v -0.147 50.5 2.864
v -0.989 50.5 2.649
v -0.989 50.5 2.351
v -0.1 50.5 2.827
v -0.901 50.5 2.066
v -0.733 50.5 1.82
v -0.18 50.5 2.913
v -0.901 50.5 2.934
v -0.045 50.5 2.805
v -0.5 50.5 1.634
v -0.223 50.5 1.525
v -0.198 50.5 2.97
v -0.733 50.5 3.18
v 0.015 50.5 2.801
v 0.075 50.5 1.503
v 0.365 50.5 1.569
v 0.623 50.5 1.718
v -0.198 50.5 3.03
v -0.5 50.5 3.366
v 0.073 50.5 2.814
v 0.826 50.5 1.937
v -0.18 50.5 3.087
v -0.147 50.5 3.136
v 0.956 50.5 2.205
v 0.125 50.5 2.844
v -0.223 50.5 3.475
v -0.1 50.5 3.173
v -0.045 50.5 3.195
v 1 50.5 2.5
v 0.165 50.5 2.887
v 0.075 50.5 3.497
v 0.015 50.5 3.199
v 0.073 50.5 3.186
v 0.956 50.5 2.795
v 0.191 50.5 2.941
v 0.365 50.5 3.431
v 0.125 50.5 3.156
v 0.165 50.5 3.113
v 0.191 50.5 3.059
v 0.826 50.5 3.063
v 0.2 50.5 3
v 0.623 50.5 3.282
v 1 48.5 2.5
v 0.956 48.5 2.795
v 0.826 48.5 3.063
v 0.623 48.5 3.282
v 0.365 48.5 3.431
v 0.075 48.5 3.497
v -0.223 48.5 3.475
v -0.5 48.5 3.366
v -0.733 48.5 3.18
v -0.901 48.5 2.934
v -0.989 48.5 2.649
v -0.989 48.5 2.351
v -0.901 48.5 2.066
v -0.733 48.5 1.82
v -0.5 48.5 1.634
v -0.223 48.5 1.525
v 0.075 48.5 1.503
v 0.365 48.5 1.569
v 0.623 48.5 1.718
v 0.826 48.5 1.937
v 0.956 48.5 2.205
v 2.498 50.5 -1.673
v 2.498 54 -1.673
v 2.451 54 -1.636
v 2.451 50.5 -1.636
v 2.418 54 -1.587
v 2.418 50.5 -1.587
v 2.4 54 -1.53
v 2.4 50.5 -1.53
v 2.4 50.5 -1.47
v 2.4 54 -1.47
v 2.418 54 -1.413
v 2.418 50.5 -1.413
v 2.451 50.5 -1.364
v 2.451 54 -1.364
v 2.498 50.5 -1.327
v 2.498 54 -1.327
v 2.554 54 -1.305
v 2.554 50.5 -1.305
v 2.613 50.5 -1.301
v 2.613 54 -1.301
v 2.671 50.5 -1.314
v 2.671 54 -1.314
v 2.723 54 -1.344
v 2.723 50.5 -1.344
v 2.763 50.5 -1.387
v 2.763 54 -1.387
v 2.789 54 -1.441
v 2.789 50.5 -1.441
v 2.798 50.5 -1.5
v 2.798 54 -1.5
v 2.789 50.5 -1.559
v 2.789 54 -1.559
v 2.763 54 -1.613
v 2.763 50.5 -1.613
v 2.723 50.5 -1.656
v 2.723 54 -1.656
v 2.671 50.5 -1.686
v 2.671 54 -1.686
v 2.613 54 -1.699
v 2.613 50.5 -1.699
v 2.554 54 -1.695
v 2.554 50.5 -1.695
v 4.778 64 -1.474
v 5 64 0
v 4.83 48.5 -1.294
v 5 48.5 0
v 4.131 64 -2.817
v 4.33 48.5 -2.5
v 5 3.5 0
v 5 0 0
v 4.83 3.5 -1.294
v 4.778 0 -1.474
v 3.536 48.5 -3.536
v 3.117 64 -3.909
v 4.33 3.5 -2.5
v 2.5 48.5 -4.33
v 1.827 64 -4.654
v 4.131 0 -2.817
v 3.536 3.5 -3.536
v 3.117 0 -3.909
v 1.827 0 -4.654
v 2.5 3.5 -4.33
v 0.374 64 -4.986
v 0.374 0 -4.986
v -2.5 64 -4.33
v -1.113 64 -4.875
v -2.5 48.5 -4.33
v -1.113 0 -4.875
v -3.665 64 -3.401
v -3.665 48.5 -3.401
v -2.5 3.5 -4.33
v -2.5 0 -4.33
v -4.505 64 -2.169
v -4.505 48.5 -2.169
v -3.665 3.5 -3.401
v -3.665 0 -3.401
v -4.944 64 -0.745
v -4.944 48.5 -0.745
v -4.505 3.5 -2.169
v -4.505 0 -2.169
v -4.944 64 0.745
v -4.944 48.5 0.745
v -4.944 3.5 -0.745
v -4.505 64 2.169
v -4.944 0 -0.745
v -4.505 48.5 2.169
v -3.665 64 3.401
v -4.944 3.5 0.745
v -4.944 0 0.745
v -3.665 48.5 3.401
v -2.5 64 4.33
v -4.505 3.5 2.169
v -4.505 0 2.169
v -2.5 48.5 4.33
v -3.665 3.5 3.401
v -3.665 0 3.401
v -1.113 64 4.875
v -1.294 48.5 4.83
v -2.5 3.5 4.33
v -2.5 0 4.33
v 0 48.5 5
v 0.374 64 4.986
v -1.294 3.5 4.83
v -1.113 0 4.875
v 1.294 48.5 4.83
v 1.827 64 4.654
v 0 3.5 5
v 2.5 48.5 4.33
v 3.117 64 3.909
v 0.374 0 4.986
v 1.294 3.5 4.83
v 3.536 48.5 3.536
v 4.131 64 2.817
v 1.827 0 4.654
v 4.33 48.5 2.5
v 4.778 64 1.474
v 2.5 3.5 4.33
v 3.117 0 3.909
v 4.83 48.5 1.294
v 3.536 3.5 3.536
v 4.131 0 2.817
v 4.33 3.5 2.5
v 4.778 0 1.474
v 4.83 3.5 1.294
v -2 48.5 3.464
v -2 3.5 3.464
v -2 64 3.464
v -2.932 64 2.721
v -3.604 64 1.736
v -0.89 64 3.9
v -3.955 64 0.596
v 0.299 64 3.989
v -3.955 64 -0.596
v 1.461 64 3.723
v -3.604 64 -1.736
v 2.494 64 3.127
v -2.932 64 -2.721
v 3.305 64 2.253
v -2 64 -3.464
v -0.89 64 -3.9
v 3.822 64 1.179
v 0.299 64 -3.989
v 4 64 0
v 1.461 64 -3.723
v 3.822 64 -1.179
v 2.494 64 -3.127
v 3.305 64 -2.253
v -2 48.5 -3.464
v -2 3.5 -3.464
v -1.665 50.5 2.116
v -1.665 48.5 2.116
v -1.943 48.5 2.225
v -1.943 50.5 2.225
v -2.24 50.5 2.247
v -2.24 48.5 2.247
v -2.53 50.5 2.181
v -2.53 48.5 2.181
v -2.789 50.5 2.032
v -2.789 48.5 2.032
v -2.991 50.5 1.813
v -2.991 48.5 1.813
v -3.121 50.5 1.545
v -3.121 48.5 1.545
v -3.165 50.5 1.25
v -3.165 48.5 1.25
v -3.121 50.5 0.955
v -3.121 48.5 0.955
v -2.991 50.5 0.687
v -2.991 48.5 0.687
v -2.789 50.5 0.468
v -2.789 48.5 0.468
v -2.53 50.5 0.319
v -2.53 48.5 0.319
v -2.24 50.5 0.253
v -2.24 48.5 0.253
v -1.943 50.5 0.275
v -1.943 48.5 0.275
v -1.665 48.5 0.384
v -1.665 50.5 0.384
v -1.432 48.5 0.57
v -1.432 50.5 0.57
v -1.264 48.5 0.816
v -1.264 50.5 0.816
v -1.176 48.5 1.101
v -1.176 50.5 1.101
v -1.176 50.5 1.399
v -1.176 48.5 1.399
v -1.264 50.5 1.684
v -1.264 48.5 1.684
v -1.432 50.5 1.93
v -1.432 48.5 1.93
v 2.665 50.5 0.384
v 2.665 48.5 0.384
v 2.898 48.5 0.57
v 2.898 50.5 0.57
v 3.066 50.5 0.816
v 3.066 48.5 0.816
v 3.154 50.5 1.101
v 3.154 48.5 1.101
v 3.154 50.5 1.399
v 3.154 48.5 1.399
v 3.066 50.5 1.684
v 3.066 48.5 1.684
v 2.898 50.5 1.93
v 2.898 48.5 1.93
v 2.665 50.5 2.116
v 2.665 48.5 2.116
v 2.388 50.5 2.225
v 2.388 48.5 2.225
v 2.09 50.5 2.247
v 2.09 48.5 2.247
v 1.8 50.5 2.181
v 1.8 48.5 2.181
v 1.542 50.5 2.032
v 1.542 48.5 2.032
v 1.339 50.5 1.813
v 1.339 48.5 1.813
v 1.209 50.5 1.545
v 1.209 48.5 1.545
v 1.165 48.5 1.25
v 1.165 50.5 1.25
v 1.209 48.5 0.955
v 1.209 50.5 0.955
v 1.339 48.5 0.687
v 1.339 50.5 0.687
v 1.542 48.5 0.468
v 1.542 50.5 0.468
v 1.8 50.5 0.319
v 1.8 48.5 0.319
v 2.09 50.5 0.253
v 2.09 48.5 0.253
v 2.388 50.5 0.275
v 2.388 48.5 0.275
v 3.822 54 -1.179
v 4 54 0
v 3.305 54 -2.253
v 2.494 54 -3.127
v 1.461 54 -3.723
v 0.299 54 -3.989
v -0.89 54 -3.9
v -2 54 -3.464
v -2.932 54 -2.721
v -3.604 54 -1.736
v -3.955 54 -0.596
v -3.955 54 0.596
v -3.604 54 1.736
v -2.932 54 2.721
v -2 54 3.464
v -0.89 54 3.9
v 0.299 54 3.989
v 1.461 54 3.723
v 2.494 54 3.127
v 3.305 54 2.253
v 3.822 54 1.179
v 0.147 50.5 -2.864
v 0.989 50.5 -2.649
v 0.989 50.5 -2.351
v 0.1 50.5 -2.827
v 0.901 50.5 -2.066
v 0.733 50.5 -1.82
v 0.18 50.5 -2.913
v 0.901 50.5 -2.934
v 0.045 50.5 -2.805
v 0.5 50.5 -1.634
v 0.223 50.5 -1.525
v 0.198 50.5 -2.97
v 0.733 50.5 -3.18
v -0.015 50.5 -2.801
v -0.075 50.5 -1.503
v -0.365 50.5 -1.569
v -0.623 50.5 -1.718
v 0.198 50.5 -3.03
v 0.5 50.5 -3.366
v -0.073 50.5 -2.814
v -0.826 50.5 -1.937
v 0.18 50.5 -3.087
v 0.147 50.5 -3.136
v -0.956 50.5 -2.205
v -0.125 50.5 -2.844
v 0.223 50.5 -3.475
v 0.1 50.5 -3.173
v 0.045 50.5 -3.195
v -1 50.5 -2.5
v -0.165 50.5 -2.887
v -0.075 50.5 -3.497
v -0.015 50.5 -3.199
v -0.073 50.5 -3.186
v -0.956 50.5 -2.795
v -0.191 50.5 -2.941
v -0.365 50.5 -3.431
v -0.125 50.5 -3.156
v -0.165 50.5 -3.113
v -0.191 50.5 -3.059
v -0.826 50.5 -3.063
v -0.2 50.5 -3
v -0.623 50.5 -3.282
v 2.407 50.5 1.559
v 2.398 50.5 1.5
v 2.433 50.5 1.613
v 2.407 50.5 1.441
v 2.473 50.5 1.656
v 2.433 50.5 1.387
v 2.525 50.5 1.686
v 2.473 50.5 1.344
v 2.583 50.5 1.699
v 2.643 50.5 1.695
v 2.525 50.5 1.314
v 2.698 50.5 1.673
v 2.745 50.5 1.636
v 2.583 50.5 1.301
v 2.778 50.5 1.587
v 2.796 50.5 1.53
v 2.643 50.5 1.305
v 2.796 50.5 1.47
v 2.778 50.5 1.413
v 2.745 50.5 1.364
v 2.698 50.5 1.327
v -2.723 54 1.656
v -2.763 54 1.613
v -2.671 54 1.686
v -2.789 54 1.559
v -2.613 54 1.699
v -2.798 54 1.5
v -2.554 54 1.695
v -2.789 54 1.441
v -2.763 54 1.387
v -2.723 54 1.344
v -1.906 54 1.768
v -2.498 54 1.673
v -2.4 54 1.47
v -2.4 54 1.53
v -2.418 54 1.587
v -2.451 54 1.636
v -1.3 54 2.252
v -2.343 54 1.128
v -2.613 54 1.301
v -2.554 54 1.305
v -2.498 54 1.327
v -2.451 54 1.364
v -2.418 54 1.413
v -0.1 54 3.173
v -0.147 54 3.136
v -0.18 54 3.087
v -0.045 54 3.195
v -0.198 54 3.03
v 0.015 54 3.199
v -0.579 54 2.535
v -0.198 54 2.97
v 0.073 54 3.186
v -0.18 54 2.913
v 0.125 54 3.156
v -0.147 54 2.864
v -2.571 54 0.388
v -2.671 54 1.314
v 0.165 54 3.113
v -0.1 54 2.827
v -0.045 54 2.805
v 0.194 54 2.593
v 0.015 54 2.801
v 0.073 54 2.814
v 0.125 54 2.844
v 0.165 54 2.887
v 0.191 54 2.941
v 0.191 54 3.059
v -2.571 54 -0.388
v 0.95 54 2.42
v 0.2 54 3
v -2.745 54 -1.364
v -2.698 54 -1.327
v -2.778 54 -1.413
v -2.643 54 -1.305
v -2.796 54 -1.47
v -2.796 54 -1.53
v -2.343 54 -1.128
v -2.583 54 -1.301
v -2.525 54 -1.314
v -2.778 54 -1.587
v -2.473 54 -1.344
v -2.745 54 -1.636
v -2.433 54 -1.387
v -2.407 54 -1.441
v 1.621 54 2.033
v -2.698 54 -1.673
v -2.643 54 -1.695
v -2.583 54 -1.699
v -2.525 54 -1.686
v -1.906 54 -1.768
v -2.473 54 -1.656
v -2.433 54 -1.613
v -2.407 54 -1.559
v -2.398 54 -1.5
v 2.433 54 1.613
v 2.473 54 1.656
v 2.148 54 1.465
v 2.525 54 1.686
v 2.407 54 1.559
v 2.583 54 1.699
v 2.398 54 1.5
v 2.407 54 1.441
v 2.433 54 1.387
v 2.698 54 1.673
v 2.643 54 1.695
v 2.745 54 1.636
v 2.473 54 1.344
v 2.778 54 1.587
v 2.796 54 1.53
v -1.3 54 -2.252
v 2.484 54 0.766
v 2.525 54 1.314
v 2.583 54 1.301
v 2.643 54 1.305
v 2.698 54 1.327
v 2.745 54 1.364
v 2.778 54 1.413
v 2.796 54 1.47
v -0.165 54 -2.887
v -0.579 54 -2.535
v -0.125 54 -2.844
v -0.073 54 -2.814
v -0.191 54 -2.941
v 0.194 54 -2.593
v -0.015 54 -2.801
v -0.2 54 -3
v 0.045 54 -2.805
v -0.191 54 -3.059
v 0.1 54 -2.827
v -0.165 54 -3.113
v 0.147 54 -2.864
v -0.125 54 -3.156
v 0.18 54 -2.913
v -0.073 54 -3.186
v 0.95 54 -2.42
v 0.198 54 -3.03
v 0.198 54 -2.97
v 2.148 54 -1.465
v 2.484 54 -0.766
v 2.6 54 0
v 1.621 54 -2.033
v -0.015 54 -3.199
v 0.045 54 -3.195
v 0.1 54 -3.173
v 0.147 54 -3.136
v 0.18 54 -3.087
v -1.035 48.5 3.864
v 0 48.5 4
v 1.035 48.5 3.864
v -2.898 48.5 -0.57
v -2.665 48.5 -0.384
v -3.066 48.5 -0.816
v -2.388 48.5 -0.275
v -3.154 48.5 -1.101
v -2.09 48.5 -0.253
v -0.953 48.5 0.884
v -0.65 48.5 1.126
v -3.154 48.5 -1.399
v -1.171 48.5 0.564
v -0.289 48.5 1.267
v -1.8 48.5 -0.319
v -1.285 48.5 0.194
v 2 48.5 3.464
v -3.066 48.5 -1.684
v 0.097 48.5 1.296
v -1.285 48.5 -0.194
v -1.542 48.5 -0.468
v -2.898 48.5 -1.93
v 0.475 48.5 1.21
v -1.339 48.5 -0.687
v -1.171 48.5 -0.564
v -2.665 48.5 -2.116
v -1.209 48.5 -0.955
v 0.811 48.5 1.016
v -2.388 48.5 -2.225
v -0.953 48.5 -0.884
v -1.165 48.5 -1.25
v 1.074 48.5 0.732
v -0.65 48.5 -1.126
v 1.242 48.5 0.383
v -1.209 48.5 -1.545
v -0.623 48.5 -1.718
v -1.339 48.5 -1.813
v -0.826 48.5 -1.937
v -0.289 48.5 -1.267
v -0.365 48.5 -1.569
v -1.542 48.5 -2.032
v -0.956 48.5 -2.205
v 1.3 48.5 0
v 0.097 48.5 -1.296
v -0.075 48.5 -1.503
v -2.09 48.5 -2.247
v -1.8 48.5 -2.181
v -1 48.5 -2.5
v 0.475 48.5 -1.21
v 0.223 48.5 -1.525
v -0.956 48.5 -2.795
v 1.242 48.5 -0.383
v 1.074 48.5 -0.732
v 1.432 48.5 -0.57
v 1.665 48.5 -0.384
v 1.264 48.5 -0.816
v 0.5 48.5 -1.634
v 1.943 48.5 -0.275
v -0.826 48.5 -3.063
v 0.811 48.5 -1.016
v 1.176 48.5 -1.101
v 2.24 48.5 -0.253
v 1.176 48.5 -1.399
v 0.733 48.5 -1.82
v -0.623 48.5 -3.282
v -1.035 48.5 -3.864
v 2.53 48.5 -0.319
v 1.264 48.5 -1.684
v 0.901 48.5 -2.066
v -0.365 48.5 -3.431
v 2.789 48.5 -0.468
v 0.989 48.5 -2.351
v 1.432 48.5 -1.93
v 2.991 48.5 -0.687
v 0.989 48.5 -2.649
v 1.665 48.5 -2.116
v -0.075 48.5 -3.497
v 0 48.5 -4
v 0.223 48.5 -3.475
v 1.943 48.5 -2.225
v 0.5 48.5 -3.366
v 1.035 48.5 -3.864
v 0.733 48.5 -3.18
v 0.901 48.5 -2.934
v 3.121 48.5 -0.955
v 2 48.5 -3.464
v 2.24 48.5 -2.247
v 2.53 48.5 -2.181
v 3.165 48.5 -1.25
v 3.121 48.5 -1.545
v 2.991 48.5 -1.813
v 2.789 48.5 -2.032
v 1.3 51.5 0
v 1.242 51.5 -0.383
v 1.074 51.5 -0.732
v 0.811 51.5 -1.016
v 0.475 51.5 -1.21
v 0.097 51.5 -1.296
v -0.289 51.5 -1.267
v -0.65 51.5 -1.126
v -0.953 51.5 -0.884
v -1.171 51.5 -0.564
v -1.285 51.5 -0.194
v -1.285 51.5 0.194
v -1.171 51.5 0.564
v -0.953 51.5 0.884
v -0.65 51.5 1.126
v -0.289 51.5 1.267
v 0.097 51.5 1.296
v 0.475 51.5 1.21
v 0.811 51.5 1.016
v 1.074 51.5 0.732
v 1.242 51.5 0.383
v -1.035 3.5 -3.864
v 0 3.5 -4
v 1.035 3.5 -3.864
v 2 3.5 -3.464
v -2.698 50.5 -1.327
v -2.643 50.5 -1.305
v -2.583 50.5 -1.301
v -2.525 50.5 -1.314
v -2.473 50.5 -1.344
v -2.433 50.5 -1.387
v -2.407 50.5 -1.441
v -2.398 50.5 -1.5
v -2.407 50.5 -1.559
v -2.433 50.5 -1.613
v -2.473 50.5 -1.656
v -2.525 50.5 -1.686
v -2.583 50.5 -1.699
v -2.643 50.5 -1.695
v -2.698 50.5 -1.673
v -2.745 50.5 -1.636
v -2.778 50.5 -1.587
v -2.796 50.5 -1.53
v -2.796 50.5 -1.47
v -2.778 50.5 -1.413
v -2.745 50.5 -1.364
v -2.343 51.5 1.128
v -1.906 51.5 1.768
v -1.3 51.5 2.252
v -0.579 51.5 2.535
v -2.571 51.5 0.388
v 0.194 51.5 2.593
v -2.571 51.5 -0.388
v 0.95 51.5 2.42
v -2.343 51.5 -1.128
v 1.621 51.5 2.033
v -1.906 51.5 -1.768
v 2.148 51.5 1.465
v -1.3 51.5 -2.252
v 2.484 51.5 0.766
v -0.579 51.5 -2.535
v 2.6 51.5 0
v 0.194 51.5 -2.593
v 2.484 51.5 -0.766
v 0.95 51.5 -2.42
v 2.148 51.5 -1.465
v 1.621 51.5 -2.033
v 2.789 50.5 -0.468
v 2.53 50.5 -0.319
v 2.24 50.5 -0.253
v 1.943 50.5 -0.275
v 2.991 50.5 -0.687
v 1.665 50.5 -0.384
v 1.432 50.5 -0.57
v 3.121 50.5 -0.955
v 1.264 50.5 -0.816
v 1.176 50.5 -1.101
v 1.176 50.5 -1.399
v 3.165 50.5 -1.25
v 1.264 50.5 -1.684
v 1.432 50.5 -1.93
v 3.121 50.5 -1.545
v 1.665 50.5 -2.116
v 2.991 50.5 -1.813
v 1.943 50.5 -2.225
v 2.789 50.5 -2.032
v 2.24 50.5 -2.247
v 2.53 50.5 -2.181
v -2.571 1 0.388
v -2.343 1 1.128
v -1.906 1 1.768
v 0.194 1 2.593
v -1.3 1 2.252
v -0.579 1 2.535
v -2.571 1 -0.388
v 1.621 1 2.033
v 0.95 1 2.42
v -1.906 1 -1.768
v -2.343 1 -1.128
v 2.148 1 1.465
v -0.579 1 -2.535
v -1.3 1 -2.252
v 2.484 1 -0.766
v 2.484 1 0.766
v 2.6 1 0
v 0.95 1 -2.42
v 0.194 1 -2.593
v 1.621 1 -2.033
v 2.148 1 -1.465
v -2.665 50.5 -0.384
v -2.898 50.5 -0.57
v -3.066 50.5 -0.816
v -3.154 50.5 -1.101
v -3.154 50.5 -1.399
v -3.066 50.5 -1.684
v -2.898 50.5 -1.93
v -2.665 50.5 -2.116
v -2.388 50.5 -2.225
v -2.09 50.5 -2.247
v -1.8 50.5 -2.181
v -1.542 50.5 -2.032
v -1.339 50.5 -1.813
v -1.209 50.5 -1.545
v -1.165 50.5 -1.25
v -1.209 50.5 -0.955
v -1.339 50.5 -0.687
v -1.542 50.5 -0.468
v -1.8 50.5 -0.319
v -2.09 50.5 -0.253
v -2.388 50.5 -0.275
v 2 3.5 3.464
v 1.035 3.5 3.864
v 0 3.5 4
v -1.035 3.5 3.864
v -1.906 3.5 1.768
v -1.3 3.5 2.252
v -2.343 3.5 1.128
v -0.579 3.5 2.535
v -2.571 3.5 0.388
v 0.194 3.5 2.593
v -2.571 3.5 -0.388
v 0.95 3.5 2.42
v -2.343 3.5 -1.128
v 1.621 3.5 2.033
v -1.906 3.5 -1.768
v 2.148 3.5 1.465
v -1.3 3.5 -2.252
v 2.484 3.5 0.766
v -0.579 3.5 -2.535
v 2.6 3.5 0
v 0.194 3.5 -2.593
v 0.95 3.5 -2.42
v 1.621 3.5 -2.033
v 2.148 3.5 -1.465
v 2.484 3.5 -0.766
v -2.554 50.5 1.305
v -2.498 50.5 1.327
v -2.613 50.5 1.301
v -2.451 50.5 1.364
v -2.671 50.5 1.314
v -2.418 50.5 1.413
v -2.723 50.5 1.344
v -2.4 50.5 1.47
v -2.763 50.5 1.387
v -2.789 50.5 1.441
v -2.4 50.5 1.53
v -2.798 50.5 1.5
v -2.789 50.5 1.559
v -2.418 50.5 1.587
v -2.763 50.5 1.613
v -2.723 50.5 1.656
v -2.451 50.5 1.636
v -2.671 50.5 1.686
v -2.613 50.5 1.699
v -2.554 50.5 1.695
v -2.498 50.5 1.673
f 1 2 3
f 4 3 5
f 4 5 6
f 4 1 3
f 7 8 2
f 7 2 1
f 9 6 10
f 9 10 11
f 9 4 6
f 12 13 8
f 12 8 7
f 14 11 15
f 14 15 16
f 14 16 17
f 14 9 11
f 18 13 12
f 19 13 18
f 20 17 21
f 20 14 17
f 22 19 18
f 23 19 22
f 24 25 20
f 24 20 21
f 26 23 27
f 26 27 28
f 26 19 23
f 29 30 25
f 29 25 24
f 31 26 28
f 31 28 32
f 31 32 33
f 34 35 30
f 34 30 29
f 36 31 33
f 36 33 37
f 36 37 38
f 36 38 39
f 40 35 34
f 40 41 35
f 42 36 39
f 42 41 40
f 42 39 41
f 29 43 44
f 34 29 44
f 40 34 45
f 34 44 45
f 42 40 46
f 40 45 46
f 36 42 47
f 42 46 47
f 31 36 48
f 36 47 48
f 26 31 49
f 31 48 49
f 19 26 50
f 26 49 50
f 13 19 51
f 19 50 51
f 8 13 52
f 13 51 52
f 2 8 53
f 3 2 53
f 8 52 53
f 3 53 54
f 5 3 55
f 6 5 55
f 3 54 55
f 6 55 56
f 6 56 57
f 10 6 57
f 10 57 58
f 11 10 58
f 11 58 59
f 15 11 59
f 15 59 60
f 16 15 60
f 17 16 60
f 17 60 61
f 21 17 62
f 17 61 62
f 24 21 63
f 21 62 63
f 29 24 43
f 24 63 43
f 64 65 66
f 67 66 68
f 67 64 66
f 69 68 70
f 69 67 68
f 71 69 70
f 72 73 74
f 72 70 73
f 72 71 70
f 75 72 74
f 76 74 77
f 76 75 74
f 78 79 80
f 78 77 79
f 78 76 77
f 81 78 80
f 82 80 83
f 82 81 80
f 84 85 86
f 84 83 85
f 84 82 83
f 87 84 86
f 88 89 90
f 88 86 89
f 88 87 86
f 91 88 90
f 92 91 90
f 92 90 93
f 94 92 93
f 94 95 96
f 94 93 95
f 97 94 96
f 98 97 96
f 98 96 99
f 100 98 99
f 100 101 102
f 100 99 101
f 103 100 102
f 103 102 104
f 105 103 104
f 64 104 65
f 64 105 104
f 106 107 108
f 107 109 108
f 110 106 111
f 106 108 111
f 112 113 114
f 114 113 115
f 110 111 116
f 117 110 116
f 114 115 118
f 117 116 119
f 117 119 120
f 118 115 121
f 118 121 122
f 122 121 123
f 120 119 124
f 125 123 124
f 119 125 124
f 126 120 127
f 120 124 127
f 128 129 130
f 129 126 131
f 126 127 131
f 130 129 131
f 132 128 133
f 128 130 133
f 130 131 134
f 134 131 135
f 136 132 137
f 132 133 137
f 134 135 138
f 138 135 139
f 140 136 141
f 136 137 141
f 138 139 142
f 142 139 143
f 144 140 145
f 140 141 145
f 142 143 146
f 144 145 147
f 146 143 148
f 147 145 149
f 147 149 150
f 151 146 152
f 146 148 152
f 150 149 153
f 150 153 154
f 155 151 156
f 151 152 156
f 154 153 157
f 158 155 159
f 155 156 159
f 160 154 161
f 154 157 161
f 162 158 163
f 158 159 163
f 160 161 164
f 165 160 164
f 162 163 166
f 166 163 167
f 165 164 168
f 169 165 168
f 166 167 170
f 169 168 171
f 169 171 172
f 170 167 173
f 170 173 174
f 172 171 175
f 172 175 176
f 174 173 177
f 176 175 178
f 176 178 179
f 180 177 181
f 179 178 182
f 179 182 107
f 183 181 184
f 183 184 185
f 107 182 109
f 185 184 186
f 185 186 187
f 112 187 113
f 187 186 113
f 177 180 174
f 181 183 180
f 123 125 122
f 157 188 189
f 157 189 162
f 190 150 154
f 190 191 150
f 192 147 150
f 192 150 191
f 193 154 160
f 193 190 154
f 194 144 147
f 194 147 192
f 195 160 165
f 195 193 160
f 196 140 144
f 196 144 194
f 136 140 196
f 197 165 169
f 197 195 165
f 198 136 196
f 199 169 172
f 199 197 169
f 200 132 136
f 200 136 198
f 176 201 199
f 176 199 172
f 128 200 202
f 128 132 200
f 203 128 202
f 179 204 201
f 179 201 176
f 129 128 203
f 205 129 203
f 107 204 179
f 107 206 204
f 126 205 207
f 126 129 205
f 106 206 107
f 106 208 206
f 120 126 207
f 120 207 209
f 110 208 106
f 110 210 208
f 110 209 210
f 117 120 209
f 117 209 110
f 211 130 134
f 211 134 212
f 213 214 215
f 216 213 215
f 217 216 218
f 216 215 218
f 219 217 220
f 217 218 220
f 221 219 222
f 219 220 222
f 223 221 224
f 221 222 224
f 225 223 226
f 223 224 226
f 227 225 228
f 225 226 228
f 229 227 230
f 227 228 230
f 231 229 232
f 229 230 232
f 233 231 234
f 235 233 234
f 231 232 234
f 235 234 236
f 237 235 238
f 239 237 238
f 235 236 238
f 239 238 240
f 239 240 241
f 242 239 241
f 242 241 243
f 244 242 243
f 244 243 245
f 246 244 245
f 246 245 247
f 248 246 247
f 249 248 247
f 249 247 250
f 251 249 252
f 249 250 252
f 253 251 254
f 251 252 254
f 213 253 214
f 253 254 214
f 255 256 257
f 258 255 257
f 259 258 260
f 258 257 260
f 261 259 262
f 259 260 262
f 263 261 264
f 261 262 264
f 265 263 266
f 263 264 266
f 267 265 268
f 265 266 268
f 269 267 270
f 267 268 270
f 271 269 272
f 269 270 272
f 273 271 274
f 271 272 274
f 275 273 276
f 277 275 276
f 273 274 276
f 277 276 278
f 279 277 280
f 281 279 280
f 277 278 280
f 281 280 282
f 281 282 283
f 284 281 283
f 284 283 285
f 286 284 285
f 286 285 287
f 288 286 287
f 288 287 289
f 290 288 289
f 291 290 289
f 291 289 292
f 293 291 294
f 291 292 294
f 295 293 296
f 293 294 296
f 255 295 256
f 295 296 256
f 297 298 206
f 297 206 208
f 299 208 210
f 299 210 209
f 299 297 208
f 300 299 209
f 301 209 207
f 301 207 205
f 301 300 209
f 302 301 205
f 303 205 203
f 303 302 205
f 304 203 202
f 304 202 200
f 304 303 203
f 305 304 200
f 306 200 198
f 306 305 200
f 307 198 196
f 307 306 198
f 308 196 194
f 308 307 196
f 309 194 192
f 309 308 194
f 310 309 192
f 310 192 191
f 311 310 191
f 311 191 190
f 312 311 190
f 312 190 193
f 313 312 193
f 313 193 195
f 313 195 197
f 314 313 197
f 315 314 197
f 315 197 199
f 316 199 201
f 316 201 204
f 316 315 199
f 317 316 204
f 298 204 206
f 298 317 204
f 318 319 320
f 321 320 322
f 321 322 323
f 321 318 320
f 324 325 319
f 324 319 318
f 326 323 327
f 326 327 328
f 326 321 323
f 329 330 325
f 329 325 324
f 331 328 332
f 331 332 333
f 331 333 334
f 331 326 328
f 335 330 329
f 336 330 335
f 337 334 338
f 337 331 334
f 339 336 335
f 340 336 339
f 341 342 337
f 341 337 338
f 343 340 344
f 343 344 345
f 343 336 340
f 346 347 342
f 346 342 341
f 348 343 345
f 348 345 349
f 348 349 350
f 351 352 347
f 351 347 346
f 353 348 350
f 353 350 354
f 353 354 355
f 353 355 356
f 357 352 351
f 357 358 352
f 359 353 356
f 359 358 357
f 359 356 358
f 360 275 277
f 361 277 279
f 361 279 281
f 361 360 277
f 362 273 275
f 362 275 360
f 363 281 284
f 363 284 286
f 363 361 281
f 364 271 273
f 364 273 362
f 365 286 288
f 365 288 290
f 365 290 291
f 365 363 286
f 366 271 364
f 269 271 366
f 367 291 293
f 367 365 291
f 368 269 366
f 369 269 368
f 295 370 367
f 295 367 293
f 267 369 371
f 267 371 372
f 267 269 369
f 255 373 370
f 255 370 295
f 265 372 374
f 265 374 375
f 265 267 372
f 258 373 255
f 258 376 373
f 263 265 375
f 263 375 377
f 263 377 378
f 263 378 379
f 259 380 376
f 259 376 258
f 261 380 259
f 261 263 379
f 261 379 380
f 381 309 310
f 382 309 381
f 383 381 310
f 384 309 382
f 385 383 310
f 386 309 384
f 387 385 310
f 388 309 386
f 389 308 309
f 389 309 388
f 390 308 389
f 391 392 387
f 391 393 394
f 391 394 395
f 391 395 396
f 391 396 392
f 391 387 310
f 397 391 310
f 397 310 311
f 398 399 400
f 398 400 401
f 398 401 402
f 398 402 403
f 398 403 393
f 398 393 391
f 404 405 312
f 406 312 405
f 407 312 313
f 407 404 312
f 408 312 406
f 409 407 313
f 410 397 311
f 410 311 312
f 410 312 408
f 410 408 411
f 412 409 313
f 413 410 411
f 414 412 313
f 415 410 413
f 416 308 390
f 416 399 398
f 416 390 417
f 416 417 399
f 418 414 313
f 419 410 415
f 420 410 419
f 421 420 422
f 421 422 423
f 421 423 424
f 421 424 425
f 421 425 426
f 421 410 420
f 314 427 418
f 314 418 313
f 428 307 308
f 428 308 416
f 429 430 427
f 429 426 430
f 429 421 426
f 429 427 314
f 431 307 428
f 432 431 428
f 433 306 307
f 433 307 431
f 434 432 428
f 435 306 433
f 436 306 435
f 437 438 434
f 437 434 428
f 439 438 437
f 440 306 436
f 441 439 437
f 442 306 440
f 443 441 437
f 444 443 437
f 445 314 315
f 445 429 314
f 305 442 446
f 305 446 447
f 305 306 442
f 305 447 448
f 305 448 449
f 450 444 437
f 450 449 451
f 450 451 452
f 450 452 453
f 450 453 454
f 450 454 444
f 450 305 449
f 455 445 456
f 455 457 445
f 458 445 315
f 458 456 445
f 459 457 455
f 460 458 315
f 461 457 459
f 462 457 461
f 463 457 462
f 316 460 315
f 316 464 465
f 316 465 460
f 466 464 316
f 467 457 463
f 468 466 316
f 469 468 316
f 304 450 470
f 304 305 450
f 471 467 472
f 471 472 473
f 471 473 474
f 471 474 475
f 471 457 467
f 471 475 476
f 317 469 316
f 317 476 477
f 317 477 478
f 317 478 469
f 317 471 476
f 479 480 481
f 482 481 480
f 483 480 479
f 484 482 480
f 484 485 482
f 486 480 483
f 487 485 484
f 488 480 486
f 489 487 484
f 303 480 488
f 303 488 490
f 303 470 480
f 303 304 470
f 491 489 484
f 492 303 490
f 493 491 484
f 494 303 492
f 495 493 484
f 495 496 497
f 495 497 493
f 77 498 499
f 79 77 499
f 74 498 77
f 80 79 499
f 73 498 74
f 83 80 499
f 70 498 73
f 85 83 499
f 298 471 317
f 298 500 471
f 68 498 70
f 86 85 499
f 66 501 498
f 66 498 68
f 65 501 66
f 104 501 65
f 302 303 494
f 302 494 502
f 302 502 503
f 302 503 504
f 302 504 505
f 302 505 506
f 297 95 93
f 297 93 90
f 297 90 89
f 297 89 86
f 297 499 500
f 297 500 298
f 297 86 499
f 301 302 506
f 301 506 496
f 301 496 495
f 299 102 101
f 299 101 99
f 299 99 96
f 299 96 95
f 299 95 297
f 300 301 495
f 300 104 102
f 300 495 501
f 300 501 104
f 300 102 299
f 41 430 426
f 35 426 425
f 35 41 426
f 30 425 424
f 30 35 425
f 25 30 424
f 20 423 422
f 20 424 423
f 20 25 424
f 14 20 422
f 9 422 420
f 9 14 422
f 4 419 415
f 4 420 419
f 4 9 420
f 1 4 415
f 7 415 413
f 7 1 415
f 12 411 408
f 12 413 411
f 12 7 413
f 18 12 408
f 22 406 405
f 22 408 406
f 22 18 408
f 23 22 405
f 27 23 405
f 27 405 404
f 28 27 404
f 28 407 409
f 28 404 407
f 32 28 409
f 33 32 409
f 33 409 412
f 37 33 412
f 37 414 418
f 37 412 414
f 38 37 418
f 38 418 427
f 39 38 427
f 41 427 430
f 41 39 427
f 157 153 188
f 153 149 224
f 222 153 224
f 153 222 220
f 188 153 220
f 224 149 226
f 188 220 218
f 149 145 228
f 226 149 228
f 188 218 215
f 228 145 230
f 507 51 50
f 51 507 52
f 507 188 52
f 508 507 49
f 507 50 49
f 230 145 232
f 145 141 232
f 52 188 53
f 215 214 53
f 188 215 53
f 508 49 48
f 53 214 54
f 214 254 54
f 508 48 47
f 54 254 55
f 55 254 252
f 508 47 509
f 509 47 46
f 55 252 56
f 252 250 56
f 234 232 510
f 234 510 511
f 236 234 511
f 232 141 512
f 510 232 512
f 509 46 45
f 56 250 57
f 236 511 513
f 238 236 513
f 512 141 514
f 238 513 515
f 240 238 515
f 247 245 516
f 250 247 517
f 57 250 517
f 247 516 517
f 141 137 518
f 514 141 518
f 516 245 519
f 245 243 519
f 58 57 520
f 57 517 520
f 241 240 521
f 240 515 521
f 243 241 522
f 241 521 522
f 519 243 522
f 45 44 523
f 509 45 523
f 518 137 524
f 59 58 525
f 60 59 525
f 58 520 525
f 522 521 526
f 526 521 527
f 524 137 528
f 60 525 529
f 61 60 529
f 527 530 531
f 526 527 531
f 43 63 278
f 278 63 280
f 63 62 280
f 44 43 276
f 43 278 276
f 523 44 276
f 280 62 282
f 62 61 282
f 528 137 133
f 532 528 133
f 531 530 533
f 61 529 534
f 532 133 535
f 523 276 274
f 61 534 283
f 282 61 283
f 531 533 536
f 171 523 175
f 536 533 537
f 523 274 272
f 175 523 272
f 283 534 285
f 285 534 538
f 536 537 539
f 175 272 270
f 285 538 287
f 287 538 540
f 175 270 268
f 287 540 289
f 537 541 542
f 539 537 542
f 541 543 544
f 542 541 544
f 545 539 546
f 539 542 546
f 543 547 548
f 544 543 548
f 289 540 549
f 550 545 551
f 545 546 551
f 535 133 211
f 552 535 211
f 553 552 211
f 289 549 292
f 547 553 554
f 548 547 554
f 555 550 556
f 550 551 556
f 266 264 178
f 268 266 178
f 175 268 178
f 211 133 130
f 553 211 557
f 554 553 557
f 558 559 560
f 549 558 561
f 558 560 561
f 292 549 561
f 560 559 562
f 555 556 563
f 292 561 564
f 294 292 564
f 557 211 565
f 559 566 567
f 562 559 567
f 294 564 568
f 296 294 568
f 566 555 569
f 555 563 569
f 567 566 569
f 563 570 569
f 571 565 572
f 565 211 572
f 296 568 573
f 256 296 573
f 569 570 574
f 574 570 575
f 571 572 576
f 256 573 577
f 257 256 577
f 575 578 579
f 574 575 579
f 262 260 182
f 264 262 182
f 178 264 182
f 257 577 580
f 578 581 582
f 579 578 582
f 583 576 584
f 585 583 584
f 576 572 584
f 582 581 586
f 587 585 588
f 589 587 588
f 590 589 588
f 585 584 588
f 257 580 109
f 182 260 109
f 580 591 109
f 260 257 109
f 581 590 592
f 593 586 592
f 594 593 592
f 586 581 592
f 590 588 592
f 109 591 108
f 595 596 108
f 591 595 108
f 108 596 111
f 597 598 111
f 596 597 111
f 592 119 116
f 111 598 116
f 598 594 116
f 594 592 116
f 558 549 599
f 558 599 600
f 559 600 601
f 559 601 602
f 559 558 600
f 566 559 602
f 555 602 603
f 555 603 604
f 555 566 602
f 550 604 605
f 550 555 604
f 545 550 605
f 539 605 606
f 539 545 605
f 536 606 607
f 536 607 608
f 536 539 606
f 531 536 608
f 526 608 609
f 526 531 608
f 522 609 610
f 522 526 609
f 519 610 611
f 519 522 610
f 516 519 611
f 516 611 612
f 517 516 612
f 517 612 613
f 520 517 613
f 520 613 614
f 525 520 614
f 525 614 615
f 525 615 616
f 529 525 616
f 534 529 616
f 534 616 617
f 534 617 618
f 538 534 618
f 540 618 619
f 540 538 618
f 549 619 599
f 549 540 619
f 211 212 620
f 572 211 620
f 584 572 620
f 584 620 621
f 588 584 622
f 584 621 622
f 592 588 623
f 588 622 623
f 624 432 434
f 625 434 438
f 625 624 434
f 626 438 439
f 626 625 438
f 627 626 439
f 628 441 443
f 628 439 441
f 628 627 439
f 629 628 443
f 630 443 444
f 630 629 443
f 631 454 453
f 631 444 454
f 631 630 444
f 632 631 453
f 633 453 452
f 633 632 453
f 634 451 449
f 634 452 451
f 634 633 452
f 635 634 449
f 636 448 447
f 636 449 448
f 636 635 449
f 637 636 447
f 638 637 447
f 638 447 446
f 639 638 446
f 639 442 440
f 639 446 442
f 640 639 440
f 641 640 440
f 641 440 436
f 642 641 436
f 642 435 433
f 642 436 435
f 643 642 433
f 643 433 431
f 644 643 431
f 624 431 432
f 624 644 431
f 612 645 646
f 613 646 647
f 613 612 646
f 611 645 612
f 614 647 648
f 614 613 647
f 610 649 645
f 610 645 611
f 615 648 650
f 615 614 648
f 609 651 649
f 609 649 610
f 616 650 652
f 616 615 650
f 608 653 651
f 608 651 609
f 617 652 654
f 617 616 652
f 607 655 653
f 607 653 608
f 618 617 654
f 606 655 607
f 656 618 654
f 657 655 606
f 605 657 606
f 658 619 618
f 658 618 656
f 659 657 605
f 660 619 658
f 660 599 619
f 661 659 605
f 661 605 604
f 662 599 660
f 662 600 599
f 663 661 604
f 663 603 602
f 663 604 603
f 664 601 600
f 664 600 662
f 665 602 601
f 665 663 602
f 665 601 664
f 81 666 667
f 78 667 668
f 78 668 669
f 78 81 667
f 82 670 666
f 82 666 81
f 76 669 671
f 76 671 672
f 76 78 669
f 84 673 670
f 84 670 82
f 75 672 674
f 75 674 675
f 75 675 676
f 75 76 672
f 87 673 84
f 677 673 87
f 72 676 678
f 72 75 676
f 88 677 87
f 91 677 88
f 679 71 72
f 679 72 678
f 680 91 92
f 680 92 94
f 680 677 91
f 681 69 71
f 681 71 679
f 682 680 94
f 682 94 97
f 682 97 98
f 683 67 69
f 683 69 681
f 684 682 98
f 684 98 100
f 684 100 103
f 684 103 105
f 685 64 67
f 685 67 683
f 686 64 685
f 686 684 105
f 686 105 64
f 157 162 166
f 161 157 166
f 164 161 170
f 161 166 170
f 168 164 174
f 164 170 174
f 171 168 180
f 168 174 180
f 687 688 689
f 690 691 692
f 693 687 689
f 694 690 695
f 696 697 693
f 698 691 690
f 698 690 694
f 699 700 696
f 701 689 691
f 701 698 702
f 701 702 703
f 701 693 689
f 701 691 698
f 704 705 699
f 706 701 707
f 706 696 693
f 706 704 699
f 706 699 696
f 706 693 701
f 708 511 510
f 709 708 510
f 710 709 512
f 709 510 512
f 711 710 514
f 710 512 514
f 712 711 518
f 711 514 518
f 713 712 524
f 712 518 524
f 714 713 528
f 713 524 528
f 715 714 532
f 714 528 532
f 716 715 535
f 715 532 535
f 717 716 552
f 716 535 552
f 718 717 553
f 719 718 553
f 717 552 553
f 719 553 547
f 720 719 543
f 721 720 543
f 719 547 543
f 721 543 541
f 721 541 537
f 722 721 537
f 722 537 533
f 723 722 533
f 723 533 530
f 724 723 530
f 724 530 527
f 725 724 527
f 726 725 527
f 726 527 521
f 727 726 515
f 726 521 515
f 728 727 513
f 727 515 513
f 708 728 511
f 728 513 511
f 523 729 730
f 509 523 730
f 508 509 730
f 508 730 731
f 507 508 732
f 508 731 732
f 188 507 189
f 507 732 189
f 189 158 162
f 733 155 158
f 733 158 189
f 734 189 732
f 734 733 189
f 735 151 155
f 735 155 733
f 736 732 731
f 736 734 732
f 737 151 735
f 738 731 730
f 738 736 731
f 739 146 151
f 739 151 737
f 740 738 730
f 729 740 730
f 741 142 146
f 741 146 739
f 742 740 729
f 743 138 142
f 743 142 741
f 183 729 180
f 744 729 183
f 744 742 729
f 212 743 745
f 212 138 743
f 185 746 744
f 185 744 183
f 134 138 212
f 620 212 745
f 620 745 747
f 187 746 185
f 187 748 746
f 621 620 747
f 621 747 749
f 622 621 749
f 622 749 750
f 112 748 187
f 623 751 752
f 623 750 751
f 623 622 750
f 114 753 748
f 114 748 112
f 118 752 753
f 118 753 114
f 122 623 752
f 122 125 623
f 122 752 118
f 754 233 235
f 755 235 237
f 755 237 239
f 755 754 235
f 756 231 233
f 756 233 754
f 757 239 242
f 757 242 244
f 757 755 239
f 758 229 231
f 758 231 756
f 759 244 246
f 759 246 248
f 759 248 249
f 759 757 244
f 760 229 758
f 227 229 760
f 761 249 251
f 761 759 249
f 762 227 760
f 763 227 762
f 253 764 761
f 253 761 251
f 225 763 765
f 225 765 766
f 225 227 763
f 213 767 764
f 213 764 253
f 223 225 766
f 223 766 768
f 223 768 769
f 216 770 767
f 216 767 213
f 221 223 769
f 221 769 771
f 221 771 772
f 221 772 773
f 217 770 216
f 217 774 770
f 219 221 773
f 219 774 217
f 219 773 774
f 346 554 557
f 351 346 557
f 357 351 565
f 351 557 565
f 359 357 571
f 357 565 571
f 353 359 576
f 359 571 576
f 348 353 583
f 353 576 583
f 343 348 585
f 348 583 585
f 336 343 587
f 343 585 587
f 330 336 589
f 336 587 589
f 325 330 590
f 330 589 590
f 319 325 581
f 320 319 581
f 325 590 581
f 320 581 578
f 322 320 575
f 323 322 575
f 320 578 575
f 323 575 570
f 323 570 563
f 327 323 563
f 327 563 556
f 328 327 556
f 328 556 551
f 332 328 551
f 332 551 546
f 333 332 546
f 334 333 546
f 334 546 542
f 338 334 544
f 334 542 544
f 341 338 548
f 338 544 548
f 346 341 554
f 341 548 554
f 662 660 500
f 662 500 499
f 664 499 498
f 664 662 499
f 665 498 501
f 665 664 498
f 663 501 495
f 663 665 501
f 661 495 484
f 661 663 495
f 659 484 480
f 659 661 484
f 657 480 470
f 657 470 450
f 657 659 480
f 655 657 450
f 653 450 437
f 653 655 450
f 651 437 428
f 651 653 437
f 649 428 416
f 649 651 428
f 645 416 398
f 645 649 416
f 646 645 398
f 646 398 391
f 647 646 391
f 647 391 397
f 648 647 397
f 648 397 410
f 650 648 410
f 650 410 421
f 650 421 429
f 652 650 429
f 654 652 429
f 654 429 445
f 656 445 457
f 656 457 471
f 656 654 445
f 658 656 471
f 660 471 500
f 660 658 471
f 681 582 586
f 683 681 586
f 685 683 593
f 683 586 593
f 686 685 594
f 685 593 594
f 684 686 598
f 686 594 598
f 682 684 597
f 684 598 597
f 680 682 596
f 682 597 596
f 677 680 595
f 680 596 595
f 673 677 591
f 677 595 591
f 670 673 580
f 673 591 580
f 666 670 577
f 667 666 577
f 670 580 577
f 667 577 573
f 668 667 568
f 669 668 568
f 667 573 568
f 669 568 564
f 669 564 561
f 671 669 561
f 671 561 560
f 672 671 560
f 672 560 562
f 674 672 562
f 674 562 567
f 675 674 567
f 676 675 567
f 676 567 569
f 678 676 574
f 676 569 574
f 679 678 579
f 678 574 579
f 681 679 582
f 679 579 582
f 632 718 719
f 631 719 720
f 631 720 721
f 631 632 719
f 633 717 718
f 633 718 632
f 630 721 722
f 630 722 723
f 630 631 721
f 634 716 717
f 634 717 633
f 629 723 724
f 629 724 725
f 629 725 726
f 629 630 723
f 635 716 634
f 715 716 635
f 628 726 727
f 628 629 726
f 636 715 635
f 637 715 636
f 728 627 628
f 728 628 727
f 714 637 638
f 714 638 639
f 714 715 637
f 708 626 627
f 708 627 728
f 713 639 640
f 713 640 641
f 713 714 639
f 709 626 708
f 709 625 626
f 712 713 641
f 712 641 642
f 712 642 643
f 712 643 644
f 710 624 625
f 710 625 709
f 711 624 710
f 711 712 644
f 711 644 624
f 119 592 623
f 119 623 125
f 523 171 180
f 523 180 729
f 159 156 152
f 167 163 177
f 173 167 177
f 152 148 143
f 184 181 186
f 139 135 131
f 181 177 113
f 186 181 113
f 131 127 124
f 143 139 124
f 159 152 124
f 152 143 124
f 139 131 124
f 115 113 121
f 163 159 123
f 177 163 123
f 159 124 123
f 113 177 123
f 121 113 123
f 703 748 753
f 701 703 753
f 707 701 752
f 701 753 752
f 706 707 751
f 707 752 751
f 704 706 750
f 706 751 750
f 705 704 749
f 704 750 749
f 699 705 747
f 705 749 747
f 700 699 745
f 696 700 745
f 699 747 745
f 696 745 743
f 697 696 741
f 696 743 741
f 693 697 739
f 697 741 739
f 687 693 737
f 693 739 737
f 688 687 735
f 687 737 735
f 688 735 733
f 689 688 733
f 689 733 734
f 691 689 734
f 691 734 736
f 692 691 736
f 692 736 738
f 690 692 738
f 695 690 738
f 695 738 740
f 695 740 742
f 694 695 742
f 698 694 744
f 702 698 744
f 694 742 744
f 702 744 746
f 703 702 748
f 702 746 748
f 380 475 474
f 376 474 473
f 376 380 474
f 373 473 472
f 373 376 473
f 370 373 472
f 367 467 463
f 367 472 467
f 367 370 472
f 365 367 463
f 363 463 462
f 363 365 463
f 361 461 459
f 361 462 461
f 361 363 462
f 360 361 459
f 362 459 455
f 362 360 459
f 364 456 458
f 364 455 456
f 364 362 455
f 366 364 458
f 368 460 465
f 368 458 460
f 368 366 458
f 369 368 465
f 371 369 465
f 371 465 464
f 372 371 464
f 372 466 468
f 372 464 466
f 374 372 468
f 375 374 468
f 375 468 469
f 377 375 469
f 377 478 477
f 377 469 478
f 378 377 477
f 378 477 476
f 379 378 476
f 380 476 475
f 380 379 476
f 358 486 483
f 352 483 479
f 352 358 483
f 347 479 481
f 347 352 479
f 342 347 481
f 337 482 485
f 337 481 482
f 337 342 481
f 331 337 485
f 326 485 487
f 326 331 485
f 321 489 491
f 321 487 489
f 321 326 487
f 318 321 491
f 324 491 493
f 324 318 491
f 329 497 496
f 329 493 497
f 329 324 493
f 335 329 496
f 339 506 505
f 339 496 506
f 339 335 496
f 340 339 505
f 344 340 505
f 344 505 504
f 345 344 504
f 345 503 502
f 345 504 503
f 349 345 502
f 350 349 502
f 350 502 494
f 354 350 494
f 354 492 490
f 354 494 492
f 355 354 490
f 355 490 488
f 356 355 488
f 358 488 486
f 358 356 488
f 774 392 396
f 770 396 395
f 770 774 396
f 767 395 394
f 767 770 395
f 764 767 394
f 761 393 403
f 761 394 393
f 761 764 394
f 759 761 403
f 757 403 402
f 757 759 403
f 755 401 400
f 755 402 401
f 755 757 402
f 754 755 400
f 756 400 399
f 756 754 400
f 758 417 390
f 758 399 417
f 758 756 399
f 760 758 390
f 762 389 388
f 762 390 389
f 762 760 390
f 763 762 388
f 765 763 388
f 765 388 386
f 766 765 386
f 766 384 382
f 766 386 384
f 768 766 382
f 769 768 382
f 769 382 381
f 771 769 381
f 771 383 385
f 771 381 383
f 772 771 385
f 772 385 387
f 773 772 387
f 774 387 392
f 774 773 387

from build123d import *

# Parameters (mm, degrees)
SKETCH1_R            = 5
BOSS_EXTRUDE1_DEPTH  = 3.5
SKETCH2_R            = 2.6
CUT_EXTRUDE1_DEPTH   = 2.5
BOSS_EXTRUDE2_DEPTH  = 45
SKETCH14_R           = 5
SKETCH14_R_2         = 1.3
BOSS_EXTRUDE8_DEPTH  = 3
SKETCH15_R           = 5
SKETCH15_R_2         = 2.6
BOSS_EXTRUDE9_DEPTH  = 2.5
SKETCH7_R            = 1
CUT_EXTRUDE2_DEPTH   = 2
CIRPATTERN1_COUNT    = 6
CUT_EXTRUDE3_START   = -3.5
SKETCH12_R           = 0.2
CUT_EXTRUDE3_DEPTH   = 4.5
CIRPATTERN2_COUNT    = 6
SKETCH16_R           = 5
SKETCH16_R_2         = 4
BOSS_EXTRUDE10_DEPTH = 10


with BuildPart() as part:
    # Sketch1 → Boss-Extrude1 (new body)
    with BuildSketch(Plane(origin=(0, 0, 0), x_dir=(1, 0, 0), z_dir=(0, 1, 0))):
        Circle(SKETCH1_R)
    extrude(amount=BOSS_EXTRUDE1_DEPTH)

    # Sketch2 → Cut-Extrude1 (cut)
    with BuildSketch(Plane(origin=(0, 3.5, 0), x_dir=(1, 0, 0), z_dir=(0, 1, 0))):
        Circle(SKETCH2_R)
    extrude(amount=-CUT_EXTRUDE1_DEPTH, mode=Mode.SUBTRACT)

    # Sketch3 → Boss-Extrude2 (add)
    with BuildSketch(Plane(origin=(0, 3.5, 0), x_dir=(1, 0, 0), z_dir=(0, 1, 0))):
        with BuildLine():
            ThreePointArc((-2.5, -4.330127019), (0, -5), (2.5, -4.330127019))
            Line((2.5, -4.330127019), (2, -3.464101615))
            ThreePointArc((2, -3.464101615), (0, -4), (-2, -3.464101615))
            Line((-2, -3.464101615), (-2.5, -4.330127019))
        make_face()
        with BuildLine():
            ThreePointArc((2.5, 4.330127019), (0, 5), (-2.5, 4.330127019))
            Line((-2.5, 4.330127019), (-2, 3.464101615))
            ThreePointArc((-2, 3.464101615), (0, 4), (2, 3.464101615))
            Line((2, 3.464101615), (2.5, 4.330127019))
        make_face()
    extrude(amount=BOSS_EXTRUDE2_DEPTH)

    # Sketch14 → Boss-Extrude8 (add)
    with BuildSketch(Plane(origin=(0, 48.5, 0), x_dir=(1, 0, 0), z_dir=(0, 1, 0))):
        Circle(SKETCH14_R)
        Circle(SKETCH14_R_2, mode=Mode.SUBTRACT)
    extrude(amount=BOSS_EXTRUDE8_DEPTH)

    # Sketch15 → Boss-Extrude9 (add)
    with BuildSketch(Plane(origin=(0, 51.5, 0), x_dir=(1, 0, 0), z_dir=(0, 1, 0))):
        Circle(SKETCH15_R)
        Circle(SKETCH15_R_2, mode=Mode.SUBTRACT)
    extrude(amount=BOSS_EXTRUDE9_DEPTH)

    # Sketch7 → Cut-Extrude2 (cut)
    with BuildSketch(Plane.XZ.offset(-48.5)):
        with Locations((0, 2.5)):
            Circle(SKETCH7_R)
    cut_extrude2 = extrude(amount=-CUT_EXTRUDE2_DEPTH, mode=Mode.SUBTRACT)

    # CirPattern1: Cut-Extrude2 ×6 about axis
    cirpattern1_axis = Axis((0, 0, 0), (0, 1, 0))
    for i in range(1, CIRPATTERN1_COUNT):
        add(cut_extrude2.rotate(cirpattern1_axis, i * 360 / CIRPATTERN1_COUNT), mode=Mode.SUBTRACT)

    # Sketch12 → Cut-Extrude3 (cut)
    with BuildSketch(Plane(origin=(0, 54, 0), x_dir=(1, 0, 0), z_dir=(0, 1, 0)).offset(CUT_EXTRUDE3_START)):
        with Locations((0, -3)):
            Circle(SKETCH12_R)
    cut_extrude3 = extrude(amount=CUT_EXTRUDE3_DEPTH, mode=Mode.SUBTRACT)

    # CirPattern2: Cut-Extrude3 ×6 about axis
    cirpattern2_axis = Axis((0, 0, 0), (0, 1, 0))
    for i in range(1, CIRPATTERN2_COUNT):
        add(cut_extrude3.rotate(cirpattern2_axis, i * 360 / CIRPATTERN2_COUNT), mode=Mode.SUBTRACT)

    # Sketch16 → Boss-Extrude10 (add)
    with BuildSketch(Plane(origin=(0, 54, 0), x_dir=(1, 0, 0), z_dir=(0, 1, 0))):
        Circle(SKETCH16_R)
        Circle(SKETCH16_R_2, mode=Mode.SUBTRACT)
    extrude(amount=BOSS_EXTRUDE10_DEPTH)


solid = part.part
